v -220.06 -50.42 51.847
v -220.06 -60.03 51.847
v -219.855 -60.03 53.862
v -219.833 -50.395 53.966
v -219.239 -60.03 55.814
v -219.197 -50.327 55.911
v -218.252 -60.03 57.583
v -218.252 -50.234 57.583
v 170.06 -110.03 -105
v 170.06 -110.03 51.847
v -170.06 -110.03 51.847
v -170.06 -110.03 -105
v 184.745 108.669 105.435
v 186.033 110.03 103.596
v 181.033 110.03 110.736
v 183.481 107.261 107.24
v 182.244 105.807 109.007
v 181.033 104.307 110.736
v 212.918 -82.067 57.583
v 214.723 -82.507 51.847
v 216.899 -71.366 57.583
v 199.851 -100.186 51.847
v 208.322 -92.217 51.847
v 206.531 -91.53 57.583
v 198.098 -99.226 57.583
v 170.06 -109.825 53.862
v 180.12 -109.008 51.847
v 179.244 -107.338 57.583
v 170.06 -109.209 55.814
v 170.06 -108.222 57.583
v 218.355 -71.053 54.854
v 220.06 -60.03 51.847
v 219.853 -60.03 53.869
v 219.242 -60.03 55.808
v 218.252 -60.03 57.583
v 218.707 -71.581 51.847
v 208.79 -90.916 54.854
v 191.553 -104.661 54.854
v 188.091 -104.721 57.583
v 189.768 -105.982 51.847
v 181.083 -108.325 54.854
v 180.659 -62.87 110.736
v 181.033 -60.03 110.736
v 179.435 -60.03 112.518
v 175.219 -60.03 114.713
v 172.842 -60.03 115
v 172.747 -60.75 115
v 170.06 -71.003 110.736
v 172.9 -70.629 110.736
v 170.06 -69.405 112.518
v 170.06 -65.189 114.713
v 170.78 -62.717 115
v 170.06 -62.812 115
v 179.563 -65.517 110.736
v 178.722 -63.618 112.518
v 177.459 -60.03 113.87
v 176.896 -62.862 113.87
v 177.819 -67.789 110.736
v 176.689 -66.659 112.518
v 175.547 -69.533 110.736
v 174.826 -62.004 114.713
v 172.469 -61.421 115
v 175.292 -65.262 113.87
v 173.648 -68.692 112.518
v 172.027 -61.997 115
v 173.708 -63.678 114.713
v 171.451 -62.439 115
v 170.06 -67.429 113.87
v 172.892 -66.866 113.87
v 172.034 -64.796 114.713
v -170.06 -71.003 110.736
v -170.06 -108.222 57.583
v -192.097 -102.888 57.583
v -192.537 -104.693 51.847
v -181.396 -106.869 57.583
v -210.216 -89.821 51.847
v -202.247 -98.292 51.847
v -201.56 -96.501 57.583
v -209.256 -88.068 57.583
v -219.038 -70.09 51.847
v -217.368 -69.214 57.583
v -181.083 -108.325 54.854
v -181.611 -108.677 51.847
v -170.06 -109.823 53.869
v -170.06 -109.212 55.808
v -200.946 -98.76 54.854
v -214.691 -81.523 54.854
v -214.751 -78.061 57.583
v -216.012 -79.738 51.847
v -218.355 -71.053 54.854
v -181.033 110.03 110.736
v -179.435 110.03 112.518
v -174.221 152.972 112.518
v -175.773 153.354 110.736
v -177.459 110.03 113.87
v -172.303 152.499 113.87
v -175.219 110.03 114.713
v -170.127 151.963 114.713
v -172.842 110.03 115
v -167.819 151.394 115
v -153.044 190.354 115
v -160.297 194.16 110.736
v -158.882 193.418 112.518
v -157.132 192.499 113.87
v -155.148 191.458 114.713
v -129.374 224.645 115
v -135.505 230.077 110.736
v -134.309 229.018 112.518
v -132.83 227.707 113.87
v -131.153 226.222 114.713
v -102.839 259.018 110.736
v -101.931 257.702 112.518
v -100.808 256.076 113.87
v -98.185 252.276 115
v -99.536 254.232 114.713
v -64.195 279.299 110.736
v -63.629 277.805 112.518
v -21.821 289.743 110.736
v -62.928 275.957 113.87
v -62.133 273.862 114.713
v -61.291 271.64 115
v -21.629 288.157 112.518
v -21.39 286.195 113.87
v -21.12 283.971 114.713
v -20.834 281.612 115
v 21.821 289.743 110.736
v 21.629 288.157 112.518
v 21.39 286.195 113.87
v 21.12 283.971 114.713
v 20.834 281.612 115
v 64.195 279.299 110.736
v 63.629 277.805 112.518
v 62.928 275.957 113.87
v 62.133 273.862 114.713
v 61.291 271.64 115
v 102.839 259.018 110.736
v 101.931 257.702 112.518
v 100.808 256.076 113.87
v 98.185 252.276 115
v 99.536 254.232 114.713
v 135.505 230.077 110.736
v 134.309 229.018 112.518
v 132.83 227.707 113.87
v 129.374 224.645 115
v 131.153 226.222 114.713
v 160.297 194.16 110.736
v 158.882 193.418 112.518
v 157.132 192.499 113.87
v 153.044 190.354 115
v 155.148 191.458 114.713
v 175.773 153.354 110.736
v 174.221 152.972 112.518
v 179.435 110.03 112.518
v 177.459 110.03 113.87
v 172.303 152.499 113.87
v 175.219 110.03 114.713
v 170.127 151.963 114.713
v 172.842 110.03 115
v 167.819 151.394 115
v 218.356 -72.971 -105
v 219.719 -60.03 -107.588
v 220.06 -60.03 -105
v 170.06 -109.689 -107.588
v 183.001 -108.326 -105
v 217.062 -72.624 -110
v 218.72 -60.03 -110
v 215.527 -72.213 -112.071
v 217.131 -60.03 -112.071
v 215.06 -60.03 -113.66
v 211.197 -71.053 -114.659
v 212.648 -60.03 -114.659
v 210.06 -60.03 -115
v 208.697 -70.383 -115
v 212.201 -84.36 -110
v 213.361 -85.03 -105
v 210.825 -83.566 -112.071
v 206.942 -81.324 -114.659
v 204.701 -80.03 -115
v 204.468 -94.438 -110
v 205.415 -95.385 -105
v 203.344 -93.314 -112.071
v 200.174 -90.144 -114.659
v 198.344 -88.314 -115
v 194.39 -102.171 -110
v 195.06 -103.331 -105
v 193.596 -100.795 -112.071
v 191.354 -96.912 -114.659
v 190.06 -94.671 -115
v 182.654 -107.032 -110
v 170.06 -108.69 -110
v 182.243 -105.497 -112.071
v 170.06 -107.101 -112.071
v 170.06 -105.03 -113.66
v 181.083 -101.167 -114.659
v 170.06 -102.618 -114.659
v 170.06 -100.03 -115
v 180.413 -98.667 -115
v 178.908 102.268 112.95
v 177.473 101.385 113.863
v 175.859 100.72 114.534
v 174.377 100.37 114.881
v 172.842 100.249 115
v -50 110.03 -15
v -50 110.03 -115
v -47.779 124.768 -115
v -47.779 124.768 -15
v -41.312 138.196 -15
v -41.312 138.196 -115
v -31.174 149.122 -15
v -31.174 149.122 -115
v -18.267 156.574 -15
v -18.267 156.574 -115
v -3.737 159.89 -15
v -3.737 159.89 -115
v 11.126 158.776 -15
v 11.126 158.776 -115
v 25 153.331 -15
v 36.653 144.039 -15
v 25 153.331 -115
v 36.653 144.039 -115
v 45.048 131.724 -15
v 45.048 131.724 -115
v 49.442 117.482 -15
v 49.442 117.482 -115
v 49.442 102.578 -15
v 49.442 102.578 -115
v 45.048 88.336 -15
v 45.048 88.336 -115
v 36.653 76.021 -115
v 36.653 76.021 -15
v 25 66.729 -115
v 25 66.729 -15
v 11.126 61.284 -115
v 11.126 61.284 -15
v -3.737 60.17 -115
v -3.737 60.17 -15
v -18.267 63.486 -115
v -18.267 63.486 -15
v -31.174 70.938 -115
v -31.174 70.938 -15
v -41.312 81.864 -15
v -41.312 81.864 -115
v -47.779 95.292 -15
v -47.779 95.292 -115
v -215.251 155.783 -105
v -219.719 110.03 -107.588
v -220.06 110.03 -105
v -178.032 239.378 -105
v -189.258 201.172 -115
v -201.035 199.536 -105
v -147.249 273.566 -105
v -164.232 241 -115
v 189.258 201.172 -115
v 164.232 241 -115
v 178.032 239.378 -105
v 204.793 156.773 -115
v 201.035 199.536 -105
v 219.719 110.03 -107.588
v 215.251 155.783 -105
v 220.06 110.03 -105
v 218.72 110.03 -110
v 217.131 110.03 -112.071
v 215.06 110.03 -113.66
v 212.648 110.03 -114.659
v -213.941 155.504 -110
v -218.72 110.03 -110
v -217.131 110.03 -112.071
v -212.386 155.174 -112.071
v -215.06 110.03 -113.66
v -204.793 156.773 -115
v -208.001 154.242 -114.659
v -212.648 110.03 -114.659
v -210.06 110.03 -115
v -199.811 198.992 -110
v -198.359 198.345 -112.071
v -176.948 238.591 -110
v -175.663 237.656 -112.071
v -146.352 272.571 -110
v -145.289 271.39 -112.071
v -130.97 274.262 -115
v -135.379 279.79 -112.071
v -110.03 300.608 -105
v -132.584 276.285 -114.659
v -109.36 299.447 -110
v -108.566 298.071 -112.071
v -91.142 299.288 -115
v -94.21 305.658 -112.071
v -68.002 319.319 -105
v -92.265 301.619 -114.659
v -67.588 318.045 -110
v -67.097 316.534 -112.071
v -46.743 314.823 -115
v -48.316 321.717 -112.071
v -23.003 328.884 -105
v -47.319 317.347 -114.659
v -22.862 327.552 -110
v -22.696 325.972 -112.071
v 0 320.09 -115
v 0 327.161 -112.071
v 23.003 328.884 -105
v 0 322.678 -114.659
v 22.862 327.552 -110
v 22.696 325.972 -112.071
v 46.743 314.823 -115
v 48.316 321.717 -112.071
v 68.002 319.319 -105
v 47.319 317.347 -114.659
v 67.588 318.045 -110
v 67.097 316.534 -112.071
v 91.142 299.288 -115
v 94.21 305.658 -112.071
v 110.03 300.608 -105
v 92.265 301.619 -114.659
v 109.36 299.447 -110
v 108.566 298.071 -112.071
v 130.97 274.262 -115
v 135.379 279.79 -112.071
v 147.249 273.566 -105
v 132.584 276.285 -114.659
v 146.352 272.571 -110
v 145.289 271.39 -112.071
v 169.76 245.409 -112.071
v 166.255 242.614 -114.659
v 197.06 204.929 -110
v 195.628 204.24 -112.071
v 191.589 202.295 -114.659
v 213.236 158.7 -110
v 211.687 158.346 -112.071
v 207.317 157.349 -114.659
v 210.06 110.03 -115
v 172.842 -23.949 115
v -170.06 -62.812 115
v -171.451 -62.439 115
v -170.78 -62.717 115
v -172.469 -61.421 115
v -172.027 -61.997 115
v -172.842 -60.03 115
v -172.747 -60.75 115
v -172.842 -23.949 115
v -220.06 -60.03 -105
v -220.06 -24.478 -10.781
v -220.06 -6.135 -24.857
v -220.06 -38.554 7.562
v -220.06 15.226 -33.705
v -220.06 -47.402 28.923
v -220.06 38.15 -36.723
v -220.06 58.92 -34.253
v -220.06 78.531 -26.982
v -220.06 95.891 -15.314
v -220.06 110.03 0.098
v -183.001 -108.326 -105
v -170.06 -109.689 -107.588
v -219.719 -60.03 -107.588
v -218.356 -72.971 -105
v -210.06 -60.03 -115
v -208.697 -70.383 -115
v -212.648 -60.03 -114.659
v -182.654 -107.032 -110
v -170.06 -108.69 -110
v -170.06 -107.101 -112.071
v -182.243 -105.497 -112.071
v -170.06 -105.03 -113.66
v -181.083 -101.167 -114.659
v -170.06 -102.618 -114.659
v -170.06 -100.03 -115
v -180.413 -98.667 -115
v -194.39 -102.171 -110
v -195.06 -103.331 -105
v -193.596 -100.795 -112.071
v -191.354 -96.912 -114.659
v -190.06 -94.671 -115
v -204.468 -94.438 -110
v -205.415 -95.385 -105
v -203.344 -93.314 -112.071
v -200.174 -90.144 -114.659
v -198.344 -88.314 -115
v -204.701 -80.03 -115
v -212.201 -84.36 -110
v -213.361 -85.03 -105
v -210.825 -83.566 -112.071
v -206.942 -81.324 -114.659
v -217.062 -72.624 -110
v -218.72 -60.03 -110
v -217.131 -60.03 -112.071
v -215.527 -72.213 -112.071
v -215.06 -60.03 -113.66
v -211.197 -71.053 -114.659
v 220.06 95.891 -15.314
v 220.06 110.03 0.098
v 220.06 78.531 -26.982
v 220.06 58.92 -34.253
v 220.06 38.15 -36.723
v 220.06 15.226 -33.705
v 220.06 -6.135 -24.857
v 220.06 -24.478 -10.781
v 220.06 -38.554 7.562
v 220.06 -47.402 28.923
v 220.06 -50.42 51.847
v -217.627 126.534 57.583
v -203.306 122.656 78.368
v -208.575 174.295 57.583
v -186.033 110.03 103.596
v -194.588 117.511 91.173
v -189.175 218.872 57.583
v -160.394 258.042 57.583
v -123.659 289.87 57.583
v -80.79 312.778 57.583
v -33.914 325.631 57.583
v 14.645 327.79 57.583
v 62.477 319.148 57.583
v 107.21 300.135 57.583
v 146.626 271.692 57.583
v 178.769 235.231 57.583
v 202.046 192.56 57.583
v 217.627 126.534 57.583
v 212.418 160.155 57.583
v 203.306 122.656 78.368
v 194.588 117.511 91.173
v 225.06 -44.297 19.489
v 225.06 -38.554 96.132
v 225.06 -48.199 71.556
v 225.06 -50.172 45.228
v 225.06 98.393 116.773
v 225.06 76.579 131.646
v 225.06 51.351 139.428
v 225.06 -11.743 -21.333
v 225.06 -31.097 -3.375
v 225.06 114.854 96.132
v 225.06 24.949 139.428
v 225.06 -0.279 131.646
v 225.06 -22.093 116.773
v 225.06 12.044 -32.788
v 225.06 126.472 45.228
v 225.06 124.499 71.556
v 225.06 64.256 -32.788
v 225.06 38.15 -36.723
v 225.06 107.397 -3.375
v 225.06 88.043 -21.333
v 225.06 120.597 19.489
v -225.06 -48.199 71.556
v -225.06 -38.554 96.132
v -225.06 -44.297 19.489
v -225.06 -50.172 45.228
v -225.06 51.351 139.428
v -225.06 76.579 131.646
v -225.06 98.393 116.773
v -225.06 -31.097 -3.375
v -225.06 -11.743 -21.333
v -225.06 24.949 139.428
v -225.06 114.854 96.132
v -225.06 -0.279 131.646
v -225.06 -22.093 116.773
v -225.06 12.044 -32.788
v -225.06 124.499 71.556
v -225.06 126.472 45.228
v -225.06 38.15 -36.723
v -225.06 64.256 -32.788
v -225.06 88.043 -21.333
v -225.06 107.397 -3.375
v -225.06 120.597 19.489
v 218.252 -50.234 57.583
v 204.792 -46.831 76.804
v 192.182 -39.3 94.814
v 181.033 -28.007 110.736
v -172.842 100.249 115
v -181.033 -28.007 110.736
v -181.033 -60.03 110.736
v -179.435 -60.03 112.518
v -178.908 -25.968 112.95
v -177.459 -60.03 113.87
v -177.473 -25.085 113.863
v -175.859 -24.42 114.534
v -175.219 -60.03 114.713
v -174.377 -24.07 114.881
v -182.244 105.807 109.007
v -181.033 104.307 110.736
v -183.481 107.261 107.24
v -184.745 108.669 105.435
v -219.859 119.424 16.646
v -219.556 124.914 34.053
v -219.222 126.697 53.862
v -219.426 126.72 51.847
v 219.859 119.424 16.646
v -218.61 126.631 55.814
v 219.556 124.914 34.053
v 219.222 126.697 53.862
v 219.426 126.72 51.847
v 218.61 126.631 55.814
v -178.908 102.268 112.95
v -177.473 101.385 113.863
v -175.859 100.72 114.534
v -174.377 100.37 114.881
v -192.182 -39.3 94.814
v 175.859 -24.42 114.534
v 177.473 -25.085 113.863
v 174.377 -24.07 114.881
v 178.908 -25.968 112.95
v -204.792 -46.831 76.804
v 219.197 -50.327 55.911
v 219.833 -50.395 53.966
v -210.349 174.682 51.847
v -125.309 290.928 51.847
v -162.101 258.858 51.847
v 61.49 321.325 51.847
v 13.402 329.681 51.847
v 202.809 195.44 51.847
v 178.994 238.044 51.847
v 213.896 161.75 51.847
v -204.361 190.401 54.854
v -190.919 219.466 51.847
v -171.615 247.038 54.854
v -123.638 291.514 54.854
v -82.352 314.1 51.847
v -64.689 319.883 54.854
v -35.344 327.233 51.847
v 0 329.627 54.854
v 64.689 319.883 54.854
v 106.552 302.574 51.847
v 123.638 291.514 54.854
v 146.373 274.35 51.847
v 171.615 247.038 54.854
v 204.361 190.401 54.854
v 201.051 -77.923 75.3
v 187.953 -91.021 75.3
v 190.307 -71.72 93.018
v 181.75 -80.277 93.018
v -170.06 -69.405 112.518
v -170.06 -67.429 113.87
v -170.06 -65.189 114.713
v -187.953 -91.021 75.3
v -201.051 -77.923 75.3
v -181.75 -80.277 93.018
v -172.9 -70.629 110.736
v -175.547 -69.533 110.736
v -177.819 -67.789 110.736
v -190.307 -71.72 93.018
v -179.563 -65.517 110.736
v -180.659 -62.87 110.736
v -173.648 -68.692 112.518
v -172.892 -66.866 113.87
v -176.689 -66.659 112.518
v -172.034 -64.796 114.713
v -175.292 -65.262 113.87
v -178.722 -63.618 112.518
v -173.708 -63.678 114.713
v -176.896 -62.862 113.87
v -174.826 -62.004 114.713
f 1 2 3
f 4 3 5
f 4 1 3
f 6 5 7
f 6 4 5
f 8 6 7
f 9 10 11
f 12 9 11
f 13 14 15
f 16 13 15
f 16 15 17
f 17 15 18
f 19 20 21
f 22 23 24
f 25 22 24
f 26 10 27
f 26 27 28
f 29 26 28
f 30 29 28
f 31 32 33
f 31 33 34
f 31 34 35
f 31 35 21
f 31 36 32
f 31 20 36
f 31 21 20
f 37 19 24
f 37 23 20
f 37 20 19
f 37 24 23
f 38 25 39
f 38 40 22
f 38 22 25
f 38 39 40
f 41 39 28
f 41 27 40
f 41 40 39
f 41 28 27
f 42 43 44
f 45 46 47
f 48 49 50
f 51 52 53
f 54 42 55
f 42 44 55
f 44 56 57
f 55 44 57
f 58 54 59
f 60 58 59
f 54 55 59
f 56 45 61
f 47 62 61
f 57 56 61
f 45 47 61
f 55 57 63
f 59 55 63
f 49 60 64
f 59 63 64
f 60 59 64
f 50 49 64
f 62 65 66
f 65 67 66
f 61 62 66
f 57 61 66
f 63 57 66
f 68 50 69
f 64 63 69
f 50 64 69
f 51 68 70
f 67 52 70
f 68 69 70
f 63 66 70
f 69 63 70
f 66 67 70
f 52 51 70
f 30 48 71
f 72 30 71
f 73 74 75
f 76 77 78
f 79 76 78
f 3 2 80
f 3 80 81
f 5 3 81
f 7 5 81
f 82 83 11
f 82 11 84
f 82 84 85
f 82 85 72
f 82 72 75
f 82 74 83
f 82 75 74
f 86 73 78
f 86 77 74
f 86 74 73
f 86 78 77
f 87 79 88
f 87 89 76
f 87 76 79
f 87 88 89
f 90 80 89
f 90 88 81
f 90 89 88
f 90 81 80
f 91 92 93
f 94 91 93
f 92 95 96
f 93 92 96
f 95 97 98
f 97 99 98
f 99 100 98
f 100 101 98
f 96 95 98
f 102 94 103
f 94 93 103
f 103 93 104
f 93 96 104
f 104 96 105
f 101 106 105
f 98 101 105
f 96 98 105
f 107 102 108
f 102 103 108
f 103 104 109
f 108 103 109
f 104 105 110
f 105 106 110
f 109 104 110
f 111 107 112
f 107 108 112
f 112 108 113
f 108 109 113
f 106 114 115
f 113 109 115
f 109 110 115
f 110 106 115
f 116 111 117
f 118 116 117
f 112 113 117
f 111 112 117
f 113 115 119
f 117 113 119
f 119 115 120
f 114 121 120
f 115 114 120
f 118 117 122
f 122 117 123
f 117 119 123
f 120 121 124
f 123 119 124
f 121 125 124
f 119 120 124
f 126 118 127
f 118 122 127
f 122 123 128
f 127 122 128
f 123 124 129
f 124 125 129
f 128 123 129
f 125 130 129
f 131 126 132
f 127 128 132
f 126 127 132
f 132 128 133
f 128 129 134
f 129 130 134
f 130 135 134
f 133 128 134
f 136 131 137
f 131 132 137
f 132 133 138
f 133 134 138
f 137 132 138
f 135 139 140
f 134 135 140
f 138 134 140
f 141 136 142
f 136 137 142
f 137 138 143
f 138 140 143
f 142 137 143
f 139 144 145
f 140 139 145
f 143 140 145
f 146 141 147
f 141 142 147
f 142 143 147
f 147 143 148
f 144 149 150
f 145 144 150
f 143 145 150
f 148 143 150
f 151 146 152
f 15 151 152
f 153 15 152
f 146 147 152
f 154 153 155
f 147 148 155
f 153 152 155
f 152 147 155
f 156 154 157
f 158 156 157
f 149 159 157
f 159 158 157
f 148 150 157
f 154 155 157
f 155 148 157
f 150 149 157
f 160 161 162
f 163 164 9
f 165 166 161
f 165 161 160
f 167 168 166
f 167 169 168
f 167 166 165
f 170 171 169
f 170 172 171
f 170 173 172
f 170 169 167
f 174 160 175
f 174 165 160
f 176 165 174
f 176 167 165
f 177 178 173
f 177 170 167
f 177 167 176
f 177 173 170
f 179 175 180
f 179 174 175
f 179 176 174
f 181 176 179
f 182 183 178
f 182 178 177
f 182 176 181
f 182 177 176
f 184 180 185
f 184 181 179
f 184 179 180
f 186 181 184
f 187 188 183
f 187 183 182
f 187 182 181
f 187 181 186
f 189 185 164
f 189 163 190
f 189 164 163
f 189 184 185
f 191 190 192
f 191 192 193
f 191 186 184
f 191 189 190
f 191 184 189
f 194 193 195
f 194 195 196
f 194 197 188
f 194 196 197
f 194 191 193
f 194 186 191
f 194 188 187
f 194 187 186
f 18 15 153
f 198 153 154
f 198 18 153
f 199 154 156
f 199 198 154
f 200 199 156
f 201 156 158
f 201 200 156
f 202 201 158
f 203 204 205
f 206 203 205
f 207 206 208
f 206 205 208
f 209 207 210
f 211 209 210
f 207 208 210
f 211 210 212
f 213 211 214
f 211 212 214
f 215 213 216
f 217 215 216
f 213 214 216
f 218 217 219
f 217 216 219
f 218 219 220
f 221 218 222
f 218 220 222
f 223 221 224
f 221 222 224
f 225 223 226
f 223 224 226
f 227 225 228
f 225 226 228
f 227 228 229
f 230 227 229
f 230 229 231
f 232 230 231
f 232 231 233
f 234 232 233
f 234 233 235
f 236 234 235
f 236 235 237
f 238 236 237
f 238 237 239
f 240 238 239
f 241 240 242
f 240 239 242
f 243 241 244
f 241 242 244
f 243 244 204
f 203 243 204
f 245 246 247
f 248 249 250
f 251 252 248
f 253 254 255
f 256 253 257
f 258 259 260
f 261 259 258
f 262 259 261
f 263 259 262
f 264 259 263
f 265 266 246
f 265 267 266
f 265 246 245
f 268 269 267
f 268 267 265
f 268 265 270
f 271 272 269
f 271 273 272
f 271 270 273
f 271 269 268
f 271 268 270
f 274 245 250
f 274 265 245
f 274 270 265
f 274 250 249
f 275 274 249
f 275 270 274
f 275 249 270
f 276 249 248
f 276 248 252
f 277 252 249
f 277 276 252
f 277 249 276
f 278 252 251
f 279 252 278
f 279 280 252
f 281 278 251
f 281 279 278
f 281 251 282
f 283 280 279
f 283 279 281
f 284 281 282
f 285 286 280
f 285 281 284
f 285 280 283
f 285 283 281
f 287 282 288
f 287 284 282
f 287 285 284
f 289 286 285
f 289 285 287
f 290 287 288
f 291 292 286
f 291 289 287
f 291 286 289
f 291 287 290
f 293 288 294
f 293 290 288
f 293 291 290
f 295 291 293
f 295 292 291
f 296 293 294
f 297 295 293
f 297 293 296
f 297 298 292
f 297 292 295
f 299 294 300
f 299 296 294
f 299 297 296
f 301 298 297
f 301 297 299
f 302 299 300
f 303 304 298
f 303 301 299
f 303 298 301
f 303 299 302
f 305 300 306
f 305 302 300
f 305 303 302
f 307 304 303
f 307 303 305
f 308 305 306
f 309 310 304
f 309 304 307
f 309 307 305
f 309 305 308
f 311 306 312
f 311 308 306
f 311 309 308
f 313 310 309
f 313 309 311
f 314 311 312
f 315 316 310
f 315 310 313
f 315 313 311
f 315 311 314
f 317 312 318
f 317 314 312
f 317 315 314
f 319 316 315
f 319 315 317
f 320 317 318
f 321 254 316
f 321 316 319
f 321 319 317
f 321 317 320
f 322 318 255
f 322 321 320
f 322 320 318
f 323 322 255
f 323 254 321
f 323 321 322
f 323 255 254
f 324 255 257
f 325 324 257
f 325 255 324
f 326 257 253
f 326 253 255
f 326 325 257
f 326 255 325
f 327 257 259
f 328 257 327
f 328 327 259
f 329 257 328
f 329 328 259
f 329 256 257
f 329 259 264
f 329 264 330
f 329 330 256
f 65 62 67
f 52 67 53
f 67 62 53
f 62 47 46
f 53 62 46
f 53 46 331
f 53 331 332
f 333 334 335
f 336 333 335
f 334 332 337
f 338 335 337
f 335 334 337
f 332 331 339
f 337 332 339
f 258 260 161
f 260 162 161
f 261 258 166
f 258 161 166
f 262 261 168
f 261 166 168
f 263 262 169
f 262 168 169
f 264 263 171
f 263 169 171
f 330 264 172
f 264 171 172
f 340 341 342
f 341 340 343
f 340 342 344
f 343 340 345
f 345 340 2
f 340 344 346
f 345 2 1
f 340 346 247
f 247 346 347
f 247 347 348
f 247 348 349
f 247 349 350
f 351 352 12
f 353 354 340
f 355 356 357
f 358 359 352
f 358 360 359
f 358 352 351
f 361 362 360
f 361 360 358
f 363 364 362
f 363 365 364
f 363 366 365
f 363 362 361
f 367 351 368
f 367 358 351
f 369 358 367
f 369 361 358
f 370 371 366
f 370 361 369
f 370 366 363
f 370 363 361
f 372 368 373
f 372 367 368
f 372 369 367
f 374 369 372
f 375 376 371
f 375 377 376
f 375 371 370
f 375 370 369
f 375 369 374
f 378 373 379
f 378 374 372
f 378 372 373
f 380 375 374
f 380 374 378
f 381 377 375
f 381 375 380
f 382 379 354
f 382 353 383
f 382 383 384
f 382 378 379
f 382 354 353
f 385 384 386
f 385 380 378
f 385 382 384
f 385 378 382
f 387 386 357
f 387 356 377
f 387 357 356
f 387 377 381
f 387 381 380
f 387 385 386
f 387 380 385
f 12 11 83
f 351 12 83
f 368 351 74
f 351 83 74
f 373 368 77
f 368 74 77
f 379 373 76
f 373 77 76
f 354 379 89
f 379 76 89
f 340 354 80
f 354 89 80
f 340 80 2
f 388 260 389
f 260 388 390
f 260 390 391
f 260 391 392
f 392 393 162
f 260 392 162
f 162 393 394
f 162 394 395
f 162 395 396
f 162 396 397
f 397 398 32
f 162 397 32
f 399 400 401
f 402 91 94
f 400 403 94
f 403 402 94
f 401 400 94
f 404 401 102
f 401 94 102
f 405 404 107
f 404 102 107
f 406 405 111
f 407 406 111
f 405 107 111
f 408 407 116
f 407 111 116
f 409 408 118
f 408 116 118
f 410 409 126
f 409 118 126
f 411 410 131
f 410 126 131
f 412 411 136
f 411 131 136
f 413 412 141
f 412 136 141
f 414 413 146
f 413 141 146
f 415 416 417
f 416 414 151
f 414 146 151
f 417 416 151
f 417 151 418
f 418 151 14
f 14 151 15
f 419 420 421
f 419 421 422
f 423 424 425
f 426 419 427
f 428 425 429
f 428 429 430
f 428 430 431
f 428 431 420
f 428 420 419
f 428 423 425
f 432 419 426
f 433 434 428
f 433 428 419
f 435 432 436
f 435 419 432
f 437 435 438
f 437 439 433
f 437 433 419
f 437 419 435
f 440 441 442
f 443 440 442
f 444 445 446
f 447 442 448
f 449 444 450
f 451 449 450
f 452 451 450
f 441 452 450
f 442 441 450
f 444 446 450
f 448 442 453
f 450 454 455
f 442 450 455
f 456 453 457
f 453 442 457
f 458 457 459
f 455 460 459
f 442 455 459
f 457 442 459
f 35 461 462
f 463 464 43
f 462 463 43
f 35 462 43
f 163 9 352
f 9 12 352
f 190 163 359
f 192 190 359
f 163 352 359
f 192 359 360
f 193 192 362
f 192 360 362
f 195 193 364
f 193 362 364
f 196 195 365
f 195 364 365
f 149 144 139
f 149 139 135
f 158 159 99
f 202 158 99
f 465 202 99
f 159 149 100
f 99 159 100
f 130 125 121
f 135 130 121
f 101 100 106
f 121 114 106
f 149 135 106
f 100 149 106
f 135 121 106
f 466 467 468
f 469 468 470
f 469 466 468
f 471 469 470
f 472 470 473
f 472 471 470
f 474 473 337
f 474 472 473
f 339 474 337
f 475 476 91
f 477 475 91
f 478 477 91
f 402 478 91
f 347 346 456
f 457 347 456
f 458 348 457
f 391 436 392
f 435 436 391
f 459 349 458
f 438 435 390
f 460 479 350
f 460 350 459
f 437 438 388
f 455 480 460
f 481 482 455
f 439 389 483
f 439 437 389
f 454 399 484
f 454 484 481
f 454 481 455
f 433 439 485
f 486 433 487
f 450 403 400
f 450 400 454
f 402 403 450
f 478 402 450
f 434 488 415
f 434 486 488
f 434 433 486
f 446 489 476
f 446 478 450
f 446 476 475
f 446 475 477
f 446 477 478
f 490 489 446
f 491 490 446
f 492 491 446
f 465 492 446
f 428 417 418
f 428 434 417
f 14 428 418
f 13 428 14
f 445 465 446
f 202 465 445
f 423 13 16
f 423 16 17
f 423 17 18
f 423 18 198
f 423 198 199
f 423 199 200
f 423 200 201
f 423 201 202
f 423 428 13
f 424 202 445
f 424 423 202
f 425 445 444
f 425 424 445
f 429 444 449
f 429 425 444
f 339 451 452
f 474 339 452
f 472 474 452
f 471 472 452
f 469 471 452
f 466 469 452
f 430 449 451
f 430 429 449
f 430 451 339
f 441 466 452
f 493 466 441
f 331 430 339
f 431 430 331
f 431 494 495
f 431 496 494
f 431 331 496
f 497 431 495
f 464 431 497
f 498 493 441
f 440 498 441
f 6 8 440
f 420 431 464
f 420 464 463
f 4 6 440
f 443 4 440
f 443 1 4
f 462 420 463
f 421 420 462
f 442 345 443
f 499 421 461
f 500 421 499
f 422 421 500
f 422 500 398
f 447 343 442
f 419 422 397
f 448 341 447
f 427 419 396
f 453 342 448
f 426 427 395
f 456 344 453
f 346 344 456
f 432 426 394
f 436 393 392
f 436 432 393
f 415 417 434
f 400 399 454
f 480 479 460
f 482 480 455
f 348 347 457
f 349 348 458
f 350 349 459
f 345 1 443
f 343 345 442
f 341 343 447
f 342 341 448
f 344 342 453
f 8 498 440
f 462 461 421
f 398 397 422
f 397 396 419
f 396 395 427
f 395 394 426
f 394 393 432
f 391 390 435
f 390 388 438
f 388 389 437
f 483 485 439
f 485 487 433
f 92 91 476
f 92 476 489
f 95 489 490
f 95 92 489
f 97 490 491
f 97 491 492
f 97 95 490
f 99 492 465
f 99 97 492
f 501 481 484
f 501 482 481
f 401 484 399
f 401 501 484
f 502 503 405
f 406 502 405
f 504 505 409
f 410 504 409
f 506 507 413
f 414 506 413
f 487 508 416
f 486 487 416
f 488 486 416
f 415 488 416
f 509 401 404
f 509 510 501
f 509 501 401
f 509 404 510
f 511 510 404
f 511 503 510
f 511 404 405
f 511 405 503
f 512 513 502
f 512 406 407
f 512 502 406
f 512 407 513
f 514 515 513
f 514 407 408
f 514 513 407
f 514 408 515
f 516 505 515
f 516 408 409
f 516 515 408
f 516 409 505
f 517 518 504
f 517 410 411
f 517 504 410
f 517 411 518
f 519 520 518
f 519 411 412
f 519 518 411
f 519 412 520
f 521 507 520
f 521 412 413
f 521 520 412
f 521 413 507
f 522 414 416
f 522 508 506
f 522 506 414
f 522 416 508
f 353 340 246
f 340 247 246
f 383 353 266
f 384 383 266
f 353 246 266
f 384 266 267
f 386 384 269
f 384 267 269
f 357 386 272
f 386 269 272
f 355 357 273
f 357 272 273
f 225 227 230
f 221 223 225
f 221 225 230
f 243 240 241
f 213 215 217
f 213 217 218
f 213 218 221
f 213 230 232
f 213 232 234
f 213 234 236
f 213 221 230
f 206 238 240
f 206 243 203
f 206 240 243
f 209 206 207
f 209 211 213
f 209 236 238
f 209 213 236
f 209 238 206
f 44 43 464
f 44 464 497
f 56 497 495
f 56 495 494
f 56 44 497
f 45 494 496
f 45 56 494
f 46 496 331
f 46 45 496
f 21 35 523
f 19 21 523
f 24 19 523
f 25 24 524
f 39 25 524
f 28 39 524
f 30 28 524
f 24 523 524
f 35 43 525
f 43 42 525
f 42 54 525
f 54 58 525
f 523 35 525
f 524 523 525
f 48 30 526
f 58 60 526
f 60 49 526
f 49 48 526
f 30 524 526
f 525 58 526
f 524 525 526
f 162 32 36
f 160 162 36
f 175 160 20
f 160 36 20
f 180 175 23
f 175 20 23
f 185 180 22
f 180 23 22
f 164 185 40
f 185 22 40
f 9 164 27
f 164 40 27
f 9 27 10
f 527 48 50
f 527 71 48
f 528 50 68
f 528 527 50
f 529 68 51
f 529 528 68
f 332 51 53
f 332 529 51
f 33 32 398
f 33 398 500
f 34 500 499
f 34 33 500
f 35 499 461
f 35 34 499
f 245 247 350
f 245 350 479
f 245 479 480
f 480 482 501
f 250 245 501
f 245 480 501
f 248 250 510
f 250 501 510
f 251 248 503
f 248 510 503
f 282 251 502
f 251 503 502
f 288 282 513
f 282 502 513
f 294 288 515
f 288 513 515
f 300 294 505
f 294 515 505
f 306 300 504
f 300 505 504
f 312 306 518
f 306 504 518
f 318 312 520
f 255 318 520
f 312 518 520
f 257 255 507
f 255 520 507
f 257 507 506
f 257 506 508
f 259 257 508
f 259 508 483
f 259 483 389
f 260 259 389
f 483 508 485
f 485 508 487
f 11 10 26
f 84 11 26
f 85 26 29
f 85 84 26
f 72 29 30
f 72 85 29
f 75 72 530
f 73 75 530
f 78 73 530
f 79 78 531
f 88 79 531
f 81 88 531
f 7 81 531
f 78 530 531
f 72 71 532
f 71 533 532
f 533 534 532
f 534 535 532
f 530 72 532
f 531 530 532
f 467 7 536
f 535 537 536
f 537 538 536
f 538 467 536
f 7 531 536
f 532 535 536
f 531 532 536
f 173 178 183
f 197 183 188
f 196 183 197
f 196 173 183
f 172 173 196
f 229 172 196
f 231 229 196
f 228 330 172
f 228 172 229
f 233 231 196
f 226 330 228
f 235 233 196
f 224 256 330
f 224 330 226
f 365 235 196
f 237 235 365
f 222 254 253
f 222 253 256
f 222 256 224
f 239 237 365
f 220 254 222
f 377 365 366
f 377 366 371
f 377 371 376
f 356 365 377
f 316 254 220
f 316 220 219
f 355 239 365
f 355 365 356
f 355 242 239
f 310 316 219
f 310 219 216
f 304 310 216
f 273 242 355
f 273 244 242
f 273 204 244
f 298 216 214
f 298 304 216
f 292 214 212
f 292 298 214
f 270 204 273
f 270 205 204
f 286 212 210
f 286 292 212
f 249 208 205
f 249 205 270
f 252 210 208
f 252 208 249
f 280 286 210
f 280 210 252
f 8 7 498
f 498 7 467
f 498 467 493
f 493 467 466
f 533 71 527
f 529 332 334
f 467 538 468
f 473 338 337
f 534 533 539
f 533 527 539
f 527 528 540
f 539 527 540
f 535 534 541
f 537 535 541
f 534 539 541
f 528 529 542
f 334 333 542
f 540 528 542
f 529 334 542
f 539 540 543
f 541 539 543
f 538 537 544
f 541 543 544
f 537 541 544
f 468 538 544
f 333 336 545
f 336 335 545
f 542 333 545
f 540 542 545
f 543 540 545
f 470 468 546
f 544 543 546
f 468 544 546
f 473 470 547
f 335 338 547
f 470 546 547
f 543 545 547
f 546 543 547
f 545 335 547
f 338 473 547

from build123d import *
from OCP.BRepFilletAPI import BRepFilletAPI_MakeChamfer

# Parameters (mm, degrees)
BOSS_EXTRUDE1_DEPTH = 115
CHAMFER3_SIZE       = 60
CHAMFER3_SIZE2      = 42.012452293
FILLET1_R           = 10
SKETCH2_R           = 88.57
BOSS_EXTRUDE2_DEPTH = 225.06
SKETCH3_R           = 50
CUT_EXTRUDE1_DEPTH  = 100


with BuildPart() as part:
    # Sketch1 → Boss-Extrude1 (new, symmetric)
    with BuildSketch(Plane.XY):
        with BuildLine():
            ThreePointArc((-220.06, 110.03), (0, 330.09), (220.06, 110.03))
            Line((220.06, 110.03), (-220.06, 110.03))
        make_face()
        with BuildLine():
            ThreePointArc((-170.06, -110.03), (-205.415339059, -95.385339059), (-220.06, -60.03))
            Line((-220.06, -60.03), (-220.06, 110.03))
            Line((-220.06, 110.03), (220.06, 110.03))
            Line((220.06, 110.03), (220.06, -60.03))
            ThreePointArc((220.06, -60.03), (205.415339059, -95.385339059), (170.06, -110.03))
            Line((170.06, -110.03), (-170.06, -110.03))
        make_face()
    extrude(amount=BOSS_EXTRUDE1_DEPTH, both=True)

    # Chamfer3: one chamfer whose edges measure the first distance from different faces: ONE call of the kernel's chamfer builder (chamfer() names one face for all edges)
    chamfer3_edges_1 = [part.edges().sort_by_distance(p)[0] for p in [
        (-220.06, 25, 115),
    ]]
    chamfer3_side_1 = [part.faces().sort_by_distance(p)[0] for p in [
        (-220.06, 25, 0),
    ]]
    chamfer3_edges_2 = [part.edges().sort_by_distance(p)[0] for p in [
        (-205.415339059, -95.385339059, 115),
    ]]
    chamfer3_side_2 = [part.faces().sort_by_distance(p)[0] for p in [
        (-205.415339059, -95.385339059, 0),
    ]]
    chamfer3_edges_3 = [part.edges().sort_by_distance(p)[0] for p in [
        (0, -110.03, 115),
    ]]
    chamfer3_side_3 = [part.faces().sort_by_distance(p)[0] for p in [
        (0, -110.03, 0),
    ]]
    chamfer3_edges_4 = [part.edges().sort_by_distance(p)[0] for p in [
        (205.415339059, -95.385339059, 115),
    ]]
    chamfer3_side_4 = [part.faces().sort_by_distance(p)[0] for p in [
        (205.415339059, -95.385339059, 0),
    ]]
    chamfer3_edges_5 = [part.edges().sort_by_distance(p)[0] for p in [
        (220.06, 25, 115),
    ]]
    chamfer3_side_5 = [part.faces().sort_by_distance(p)[0] for p in [
        (220.06, 25, 0),
    ]]
    chamfer3_edges_6 = [part.edges().sort_by_distance(p)[0] for p in [
        (0, 330.09, 115),
    ]]
    chamfer3_side_6 = [part.faces().sort_by_distance(p)[0] for p in [
        (0, 330.09, 0),
    ]]
    chamfer3 = BRepFilletAPI_MakeChamfer(part.part.solid().wrapped)
    for e in chamfer3_edges_1:
        chamfer3.Add(CHAMFER3_SIZE, CHAMFER3_SIZE2, e.wrapped, chamfer3_side_1[0].wrapped)  # the first distance lies on this face
    for e in chamfer3_edges_2:
        chamfer3.Add(CHAMFER3_SIZE, CHAMFER3_SIZE2, e.wrapped, chamfer3_side_2[0].wrapped)  # the first distance lies on this face
    for e in chamfer3_edges_3:
        chamfer3.Add(CHAMFER3_SIZE, CHAMFER3_SIZE2, e.wrapped, chamfer3_side_3[0].wrapped)  # the first distance lies on this face
    for e in chamfer3_edges_4:
        chamfer3.Add(CHAMFER3_SIZE, CHAMFER3_SIZE2, e.wrapped, chamfer3_side_4[0].wrapped)  # the first distance lies on this face
    for e in chamfer3_edges_5:
        chamfer3.Add(CHAMFER3_SIZE, CHAMFER3_SIZE2, e.wrapped, chamfer3_side_5[0].wrapped)  # the first distance lies on this face
    for e in chamfer3_edges_6:
        chamfer3.Add(CHAMFER3_SIZE, CHAMFER3_SIZE2, e.wrapped, chamfer3_side_6[0].wrapped)  # the first distance lies on this face
    add(Compound.cast(chamfer3.Shape()), mode=Mode.REPLACE)

    # Fillet1
    fillet1_edges = [part.edges().sort_by_distance(p)[0] for p in [
        (0, 330.09, -115),
        (220.06, 25, 55),
        (0, 288.077547707, 115),
        (-178.047547707, 25, 115),
        (-175.708049149, -65.678049149, 115),
        (0, -68.017547707, 115),
        (175.708049149, -65.678049149, 115),
        (178.047547707, 25, 115),
        (205.415339059, -95.385339059, 55),
        (0, -110.03, 55),
        (-205.415339059, -95.385339059, 55),
        (-220.06, 25, 55),
        (0, 330.09, 55),
        (220.06, 25, -115),
        (205.415339059, -95.385339059, -115),
        (0, -110.03, -115),
        (-205.415339059, -95.385339059, -115),
        (-220.06, 25, -115),
    ]]
    fillet(fillet1_edges, radius=FILLET1_R)

    # Sketch2 → Boss-Extrude2 (add, symmetric)
    with BuildSketch(Plane(origin=(0, 0, 0), x_dir=(0, 0, -1), z_dir=(1, 0, 0))):
        with Locations((-51.847012111, 38.15)):
            Circle(SKETCH2_R)
    extrude(amount=BOSS_EXTRUDE2_DEPTH, both=True)

    # Sketch3 → Cut-Extrude1 (cut)
    with BuildSketch(Plane(origin=(0, 0, -115), x_dir=(-1, 0, 0), z_dir=(0, 0, -1))):
        with Locations((0, 110.03)):
            Circle(SKETCH3_R)
    extrude(amount=-CUT_EXTRUDE1_DEPTH, mode=Mode.SUBTRACT)


solid = part.part
